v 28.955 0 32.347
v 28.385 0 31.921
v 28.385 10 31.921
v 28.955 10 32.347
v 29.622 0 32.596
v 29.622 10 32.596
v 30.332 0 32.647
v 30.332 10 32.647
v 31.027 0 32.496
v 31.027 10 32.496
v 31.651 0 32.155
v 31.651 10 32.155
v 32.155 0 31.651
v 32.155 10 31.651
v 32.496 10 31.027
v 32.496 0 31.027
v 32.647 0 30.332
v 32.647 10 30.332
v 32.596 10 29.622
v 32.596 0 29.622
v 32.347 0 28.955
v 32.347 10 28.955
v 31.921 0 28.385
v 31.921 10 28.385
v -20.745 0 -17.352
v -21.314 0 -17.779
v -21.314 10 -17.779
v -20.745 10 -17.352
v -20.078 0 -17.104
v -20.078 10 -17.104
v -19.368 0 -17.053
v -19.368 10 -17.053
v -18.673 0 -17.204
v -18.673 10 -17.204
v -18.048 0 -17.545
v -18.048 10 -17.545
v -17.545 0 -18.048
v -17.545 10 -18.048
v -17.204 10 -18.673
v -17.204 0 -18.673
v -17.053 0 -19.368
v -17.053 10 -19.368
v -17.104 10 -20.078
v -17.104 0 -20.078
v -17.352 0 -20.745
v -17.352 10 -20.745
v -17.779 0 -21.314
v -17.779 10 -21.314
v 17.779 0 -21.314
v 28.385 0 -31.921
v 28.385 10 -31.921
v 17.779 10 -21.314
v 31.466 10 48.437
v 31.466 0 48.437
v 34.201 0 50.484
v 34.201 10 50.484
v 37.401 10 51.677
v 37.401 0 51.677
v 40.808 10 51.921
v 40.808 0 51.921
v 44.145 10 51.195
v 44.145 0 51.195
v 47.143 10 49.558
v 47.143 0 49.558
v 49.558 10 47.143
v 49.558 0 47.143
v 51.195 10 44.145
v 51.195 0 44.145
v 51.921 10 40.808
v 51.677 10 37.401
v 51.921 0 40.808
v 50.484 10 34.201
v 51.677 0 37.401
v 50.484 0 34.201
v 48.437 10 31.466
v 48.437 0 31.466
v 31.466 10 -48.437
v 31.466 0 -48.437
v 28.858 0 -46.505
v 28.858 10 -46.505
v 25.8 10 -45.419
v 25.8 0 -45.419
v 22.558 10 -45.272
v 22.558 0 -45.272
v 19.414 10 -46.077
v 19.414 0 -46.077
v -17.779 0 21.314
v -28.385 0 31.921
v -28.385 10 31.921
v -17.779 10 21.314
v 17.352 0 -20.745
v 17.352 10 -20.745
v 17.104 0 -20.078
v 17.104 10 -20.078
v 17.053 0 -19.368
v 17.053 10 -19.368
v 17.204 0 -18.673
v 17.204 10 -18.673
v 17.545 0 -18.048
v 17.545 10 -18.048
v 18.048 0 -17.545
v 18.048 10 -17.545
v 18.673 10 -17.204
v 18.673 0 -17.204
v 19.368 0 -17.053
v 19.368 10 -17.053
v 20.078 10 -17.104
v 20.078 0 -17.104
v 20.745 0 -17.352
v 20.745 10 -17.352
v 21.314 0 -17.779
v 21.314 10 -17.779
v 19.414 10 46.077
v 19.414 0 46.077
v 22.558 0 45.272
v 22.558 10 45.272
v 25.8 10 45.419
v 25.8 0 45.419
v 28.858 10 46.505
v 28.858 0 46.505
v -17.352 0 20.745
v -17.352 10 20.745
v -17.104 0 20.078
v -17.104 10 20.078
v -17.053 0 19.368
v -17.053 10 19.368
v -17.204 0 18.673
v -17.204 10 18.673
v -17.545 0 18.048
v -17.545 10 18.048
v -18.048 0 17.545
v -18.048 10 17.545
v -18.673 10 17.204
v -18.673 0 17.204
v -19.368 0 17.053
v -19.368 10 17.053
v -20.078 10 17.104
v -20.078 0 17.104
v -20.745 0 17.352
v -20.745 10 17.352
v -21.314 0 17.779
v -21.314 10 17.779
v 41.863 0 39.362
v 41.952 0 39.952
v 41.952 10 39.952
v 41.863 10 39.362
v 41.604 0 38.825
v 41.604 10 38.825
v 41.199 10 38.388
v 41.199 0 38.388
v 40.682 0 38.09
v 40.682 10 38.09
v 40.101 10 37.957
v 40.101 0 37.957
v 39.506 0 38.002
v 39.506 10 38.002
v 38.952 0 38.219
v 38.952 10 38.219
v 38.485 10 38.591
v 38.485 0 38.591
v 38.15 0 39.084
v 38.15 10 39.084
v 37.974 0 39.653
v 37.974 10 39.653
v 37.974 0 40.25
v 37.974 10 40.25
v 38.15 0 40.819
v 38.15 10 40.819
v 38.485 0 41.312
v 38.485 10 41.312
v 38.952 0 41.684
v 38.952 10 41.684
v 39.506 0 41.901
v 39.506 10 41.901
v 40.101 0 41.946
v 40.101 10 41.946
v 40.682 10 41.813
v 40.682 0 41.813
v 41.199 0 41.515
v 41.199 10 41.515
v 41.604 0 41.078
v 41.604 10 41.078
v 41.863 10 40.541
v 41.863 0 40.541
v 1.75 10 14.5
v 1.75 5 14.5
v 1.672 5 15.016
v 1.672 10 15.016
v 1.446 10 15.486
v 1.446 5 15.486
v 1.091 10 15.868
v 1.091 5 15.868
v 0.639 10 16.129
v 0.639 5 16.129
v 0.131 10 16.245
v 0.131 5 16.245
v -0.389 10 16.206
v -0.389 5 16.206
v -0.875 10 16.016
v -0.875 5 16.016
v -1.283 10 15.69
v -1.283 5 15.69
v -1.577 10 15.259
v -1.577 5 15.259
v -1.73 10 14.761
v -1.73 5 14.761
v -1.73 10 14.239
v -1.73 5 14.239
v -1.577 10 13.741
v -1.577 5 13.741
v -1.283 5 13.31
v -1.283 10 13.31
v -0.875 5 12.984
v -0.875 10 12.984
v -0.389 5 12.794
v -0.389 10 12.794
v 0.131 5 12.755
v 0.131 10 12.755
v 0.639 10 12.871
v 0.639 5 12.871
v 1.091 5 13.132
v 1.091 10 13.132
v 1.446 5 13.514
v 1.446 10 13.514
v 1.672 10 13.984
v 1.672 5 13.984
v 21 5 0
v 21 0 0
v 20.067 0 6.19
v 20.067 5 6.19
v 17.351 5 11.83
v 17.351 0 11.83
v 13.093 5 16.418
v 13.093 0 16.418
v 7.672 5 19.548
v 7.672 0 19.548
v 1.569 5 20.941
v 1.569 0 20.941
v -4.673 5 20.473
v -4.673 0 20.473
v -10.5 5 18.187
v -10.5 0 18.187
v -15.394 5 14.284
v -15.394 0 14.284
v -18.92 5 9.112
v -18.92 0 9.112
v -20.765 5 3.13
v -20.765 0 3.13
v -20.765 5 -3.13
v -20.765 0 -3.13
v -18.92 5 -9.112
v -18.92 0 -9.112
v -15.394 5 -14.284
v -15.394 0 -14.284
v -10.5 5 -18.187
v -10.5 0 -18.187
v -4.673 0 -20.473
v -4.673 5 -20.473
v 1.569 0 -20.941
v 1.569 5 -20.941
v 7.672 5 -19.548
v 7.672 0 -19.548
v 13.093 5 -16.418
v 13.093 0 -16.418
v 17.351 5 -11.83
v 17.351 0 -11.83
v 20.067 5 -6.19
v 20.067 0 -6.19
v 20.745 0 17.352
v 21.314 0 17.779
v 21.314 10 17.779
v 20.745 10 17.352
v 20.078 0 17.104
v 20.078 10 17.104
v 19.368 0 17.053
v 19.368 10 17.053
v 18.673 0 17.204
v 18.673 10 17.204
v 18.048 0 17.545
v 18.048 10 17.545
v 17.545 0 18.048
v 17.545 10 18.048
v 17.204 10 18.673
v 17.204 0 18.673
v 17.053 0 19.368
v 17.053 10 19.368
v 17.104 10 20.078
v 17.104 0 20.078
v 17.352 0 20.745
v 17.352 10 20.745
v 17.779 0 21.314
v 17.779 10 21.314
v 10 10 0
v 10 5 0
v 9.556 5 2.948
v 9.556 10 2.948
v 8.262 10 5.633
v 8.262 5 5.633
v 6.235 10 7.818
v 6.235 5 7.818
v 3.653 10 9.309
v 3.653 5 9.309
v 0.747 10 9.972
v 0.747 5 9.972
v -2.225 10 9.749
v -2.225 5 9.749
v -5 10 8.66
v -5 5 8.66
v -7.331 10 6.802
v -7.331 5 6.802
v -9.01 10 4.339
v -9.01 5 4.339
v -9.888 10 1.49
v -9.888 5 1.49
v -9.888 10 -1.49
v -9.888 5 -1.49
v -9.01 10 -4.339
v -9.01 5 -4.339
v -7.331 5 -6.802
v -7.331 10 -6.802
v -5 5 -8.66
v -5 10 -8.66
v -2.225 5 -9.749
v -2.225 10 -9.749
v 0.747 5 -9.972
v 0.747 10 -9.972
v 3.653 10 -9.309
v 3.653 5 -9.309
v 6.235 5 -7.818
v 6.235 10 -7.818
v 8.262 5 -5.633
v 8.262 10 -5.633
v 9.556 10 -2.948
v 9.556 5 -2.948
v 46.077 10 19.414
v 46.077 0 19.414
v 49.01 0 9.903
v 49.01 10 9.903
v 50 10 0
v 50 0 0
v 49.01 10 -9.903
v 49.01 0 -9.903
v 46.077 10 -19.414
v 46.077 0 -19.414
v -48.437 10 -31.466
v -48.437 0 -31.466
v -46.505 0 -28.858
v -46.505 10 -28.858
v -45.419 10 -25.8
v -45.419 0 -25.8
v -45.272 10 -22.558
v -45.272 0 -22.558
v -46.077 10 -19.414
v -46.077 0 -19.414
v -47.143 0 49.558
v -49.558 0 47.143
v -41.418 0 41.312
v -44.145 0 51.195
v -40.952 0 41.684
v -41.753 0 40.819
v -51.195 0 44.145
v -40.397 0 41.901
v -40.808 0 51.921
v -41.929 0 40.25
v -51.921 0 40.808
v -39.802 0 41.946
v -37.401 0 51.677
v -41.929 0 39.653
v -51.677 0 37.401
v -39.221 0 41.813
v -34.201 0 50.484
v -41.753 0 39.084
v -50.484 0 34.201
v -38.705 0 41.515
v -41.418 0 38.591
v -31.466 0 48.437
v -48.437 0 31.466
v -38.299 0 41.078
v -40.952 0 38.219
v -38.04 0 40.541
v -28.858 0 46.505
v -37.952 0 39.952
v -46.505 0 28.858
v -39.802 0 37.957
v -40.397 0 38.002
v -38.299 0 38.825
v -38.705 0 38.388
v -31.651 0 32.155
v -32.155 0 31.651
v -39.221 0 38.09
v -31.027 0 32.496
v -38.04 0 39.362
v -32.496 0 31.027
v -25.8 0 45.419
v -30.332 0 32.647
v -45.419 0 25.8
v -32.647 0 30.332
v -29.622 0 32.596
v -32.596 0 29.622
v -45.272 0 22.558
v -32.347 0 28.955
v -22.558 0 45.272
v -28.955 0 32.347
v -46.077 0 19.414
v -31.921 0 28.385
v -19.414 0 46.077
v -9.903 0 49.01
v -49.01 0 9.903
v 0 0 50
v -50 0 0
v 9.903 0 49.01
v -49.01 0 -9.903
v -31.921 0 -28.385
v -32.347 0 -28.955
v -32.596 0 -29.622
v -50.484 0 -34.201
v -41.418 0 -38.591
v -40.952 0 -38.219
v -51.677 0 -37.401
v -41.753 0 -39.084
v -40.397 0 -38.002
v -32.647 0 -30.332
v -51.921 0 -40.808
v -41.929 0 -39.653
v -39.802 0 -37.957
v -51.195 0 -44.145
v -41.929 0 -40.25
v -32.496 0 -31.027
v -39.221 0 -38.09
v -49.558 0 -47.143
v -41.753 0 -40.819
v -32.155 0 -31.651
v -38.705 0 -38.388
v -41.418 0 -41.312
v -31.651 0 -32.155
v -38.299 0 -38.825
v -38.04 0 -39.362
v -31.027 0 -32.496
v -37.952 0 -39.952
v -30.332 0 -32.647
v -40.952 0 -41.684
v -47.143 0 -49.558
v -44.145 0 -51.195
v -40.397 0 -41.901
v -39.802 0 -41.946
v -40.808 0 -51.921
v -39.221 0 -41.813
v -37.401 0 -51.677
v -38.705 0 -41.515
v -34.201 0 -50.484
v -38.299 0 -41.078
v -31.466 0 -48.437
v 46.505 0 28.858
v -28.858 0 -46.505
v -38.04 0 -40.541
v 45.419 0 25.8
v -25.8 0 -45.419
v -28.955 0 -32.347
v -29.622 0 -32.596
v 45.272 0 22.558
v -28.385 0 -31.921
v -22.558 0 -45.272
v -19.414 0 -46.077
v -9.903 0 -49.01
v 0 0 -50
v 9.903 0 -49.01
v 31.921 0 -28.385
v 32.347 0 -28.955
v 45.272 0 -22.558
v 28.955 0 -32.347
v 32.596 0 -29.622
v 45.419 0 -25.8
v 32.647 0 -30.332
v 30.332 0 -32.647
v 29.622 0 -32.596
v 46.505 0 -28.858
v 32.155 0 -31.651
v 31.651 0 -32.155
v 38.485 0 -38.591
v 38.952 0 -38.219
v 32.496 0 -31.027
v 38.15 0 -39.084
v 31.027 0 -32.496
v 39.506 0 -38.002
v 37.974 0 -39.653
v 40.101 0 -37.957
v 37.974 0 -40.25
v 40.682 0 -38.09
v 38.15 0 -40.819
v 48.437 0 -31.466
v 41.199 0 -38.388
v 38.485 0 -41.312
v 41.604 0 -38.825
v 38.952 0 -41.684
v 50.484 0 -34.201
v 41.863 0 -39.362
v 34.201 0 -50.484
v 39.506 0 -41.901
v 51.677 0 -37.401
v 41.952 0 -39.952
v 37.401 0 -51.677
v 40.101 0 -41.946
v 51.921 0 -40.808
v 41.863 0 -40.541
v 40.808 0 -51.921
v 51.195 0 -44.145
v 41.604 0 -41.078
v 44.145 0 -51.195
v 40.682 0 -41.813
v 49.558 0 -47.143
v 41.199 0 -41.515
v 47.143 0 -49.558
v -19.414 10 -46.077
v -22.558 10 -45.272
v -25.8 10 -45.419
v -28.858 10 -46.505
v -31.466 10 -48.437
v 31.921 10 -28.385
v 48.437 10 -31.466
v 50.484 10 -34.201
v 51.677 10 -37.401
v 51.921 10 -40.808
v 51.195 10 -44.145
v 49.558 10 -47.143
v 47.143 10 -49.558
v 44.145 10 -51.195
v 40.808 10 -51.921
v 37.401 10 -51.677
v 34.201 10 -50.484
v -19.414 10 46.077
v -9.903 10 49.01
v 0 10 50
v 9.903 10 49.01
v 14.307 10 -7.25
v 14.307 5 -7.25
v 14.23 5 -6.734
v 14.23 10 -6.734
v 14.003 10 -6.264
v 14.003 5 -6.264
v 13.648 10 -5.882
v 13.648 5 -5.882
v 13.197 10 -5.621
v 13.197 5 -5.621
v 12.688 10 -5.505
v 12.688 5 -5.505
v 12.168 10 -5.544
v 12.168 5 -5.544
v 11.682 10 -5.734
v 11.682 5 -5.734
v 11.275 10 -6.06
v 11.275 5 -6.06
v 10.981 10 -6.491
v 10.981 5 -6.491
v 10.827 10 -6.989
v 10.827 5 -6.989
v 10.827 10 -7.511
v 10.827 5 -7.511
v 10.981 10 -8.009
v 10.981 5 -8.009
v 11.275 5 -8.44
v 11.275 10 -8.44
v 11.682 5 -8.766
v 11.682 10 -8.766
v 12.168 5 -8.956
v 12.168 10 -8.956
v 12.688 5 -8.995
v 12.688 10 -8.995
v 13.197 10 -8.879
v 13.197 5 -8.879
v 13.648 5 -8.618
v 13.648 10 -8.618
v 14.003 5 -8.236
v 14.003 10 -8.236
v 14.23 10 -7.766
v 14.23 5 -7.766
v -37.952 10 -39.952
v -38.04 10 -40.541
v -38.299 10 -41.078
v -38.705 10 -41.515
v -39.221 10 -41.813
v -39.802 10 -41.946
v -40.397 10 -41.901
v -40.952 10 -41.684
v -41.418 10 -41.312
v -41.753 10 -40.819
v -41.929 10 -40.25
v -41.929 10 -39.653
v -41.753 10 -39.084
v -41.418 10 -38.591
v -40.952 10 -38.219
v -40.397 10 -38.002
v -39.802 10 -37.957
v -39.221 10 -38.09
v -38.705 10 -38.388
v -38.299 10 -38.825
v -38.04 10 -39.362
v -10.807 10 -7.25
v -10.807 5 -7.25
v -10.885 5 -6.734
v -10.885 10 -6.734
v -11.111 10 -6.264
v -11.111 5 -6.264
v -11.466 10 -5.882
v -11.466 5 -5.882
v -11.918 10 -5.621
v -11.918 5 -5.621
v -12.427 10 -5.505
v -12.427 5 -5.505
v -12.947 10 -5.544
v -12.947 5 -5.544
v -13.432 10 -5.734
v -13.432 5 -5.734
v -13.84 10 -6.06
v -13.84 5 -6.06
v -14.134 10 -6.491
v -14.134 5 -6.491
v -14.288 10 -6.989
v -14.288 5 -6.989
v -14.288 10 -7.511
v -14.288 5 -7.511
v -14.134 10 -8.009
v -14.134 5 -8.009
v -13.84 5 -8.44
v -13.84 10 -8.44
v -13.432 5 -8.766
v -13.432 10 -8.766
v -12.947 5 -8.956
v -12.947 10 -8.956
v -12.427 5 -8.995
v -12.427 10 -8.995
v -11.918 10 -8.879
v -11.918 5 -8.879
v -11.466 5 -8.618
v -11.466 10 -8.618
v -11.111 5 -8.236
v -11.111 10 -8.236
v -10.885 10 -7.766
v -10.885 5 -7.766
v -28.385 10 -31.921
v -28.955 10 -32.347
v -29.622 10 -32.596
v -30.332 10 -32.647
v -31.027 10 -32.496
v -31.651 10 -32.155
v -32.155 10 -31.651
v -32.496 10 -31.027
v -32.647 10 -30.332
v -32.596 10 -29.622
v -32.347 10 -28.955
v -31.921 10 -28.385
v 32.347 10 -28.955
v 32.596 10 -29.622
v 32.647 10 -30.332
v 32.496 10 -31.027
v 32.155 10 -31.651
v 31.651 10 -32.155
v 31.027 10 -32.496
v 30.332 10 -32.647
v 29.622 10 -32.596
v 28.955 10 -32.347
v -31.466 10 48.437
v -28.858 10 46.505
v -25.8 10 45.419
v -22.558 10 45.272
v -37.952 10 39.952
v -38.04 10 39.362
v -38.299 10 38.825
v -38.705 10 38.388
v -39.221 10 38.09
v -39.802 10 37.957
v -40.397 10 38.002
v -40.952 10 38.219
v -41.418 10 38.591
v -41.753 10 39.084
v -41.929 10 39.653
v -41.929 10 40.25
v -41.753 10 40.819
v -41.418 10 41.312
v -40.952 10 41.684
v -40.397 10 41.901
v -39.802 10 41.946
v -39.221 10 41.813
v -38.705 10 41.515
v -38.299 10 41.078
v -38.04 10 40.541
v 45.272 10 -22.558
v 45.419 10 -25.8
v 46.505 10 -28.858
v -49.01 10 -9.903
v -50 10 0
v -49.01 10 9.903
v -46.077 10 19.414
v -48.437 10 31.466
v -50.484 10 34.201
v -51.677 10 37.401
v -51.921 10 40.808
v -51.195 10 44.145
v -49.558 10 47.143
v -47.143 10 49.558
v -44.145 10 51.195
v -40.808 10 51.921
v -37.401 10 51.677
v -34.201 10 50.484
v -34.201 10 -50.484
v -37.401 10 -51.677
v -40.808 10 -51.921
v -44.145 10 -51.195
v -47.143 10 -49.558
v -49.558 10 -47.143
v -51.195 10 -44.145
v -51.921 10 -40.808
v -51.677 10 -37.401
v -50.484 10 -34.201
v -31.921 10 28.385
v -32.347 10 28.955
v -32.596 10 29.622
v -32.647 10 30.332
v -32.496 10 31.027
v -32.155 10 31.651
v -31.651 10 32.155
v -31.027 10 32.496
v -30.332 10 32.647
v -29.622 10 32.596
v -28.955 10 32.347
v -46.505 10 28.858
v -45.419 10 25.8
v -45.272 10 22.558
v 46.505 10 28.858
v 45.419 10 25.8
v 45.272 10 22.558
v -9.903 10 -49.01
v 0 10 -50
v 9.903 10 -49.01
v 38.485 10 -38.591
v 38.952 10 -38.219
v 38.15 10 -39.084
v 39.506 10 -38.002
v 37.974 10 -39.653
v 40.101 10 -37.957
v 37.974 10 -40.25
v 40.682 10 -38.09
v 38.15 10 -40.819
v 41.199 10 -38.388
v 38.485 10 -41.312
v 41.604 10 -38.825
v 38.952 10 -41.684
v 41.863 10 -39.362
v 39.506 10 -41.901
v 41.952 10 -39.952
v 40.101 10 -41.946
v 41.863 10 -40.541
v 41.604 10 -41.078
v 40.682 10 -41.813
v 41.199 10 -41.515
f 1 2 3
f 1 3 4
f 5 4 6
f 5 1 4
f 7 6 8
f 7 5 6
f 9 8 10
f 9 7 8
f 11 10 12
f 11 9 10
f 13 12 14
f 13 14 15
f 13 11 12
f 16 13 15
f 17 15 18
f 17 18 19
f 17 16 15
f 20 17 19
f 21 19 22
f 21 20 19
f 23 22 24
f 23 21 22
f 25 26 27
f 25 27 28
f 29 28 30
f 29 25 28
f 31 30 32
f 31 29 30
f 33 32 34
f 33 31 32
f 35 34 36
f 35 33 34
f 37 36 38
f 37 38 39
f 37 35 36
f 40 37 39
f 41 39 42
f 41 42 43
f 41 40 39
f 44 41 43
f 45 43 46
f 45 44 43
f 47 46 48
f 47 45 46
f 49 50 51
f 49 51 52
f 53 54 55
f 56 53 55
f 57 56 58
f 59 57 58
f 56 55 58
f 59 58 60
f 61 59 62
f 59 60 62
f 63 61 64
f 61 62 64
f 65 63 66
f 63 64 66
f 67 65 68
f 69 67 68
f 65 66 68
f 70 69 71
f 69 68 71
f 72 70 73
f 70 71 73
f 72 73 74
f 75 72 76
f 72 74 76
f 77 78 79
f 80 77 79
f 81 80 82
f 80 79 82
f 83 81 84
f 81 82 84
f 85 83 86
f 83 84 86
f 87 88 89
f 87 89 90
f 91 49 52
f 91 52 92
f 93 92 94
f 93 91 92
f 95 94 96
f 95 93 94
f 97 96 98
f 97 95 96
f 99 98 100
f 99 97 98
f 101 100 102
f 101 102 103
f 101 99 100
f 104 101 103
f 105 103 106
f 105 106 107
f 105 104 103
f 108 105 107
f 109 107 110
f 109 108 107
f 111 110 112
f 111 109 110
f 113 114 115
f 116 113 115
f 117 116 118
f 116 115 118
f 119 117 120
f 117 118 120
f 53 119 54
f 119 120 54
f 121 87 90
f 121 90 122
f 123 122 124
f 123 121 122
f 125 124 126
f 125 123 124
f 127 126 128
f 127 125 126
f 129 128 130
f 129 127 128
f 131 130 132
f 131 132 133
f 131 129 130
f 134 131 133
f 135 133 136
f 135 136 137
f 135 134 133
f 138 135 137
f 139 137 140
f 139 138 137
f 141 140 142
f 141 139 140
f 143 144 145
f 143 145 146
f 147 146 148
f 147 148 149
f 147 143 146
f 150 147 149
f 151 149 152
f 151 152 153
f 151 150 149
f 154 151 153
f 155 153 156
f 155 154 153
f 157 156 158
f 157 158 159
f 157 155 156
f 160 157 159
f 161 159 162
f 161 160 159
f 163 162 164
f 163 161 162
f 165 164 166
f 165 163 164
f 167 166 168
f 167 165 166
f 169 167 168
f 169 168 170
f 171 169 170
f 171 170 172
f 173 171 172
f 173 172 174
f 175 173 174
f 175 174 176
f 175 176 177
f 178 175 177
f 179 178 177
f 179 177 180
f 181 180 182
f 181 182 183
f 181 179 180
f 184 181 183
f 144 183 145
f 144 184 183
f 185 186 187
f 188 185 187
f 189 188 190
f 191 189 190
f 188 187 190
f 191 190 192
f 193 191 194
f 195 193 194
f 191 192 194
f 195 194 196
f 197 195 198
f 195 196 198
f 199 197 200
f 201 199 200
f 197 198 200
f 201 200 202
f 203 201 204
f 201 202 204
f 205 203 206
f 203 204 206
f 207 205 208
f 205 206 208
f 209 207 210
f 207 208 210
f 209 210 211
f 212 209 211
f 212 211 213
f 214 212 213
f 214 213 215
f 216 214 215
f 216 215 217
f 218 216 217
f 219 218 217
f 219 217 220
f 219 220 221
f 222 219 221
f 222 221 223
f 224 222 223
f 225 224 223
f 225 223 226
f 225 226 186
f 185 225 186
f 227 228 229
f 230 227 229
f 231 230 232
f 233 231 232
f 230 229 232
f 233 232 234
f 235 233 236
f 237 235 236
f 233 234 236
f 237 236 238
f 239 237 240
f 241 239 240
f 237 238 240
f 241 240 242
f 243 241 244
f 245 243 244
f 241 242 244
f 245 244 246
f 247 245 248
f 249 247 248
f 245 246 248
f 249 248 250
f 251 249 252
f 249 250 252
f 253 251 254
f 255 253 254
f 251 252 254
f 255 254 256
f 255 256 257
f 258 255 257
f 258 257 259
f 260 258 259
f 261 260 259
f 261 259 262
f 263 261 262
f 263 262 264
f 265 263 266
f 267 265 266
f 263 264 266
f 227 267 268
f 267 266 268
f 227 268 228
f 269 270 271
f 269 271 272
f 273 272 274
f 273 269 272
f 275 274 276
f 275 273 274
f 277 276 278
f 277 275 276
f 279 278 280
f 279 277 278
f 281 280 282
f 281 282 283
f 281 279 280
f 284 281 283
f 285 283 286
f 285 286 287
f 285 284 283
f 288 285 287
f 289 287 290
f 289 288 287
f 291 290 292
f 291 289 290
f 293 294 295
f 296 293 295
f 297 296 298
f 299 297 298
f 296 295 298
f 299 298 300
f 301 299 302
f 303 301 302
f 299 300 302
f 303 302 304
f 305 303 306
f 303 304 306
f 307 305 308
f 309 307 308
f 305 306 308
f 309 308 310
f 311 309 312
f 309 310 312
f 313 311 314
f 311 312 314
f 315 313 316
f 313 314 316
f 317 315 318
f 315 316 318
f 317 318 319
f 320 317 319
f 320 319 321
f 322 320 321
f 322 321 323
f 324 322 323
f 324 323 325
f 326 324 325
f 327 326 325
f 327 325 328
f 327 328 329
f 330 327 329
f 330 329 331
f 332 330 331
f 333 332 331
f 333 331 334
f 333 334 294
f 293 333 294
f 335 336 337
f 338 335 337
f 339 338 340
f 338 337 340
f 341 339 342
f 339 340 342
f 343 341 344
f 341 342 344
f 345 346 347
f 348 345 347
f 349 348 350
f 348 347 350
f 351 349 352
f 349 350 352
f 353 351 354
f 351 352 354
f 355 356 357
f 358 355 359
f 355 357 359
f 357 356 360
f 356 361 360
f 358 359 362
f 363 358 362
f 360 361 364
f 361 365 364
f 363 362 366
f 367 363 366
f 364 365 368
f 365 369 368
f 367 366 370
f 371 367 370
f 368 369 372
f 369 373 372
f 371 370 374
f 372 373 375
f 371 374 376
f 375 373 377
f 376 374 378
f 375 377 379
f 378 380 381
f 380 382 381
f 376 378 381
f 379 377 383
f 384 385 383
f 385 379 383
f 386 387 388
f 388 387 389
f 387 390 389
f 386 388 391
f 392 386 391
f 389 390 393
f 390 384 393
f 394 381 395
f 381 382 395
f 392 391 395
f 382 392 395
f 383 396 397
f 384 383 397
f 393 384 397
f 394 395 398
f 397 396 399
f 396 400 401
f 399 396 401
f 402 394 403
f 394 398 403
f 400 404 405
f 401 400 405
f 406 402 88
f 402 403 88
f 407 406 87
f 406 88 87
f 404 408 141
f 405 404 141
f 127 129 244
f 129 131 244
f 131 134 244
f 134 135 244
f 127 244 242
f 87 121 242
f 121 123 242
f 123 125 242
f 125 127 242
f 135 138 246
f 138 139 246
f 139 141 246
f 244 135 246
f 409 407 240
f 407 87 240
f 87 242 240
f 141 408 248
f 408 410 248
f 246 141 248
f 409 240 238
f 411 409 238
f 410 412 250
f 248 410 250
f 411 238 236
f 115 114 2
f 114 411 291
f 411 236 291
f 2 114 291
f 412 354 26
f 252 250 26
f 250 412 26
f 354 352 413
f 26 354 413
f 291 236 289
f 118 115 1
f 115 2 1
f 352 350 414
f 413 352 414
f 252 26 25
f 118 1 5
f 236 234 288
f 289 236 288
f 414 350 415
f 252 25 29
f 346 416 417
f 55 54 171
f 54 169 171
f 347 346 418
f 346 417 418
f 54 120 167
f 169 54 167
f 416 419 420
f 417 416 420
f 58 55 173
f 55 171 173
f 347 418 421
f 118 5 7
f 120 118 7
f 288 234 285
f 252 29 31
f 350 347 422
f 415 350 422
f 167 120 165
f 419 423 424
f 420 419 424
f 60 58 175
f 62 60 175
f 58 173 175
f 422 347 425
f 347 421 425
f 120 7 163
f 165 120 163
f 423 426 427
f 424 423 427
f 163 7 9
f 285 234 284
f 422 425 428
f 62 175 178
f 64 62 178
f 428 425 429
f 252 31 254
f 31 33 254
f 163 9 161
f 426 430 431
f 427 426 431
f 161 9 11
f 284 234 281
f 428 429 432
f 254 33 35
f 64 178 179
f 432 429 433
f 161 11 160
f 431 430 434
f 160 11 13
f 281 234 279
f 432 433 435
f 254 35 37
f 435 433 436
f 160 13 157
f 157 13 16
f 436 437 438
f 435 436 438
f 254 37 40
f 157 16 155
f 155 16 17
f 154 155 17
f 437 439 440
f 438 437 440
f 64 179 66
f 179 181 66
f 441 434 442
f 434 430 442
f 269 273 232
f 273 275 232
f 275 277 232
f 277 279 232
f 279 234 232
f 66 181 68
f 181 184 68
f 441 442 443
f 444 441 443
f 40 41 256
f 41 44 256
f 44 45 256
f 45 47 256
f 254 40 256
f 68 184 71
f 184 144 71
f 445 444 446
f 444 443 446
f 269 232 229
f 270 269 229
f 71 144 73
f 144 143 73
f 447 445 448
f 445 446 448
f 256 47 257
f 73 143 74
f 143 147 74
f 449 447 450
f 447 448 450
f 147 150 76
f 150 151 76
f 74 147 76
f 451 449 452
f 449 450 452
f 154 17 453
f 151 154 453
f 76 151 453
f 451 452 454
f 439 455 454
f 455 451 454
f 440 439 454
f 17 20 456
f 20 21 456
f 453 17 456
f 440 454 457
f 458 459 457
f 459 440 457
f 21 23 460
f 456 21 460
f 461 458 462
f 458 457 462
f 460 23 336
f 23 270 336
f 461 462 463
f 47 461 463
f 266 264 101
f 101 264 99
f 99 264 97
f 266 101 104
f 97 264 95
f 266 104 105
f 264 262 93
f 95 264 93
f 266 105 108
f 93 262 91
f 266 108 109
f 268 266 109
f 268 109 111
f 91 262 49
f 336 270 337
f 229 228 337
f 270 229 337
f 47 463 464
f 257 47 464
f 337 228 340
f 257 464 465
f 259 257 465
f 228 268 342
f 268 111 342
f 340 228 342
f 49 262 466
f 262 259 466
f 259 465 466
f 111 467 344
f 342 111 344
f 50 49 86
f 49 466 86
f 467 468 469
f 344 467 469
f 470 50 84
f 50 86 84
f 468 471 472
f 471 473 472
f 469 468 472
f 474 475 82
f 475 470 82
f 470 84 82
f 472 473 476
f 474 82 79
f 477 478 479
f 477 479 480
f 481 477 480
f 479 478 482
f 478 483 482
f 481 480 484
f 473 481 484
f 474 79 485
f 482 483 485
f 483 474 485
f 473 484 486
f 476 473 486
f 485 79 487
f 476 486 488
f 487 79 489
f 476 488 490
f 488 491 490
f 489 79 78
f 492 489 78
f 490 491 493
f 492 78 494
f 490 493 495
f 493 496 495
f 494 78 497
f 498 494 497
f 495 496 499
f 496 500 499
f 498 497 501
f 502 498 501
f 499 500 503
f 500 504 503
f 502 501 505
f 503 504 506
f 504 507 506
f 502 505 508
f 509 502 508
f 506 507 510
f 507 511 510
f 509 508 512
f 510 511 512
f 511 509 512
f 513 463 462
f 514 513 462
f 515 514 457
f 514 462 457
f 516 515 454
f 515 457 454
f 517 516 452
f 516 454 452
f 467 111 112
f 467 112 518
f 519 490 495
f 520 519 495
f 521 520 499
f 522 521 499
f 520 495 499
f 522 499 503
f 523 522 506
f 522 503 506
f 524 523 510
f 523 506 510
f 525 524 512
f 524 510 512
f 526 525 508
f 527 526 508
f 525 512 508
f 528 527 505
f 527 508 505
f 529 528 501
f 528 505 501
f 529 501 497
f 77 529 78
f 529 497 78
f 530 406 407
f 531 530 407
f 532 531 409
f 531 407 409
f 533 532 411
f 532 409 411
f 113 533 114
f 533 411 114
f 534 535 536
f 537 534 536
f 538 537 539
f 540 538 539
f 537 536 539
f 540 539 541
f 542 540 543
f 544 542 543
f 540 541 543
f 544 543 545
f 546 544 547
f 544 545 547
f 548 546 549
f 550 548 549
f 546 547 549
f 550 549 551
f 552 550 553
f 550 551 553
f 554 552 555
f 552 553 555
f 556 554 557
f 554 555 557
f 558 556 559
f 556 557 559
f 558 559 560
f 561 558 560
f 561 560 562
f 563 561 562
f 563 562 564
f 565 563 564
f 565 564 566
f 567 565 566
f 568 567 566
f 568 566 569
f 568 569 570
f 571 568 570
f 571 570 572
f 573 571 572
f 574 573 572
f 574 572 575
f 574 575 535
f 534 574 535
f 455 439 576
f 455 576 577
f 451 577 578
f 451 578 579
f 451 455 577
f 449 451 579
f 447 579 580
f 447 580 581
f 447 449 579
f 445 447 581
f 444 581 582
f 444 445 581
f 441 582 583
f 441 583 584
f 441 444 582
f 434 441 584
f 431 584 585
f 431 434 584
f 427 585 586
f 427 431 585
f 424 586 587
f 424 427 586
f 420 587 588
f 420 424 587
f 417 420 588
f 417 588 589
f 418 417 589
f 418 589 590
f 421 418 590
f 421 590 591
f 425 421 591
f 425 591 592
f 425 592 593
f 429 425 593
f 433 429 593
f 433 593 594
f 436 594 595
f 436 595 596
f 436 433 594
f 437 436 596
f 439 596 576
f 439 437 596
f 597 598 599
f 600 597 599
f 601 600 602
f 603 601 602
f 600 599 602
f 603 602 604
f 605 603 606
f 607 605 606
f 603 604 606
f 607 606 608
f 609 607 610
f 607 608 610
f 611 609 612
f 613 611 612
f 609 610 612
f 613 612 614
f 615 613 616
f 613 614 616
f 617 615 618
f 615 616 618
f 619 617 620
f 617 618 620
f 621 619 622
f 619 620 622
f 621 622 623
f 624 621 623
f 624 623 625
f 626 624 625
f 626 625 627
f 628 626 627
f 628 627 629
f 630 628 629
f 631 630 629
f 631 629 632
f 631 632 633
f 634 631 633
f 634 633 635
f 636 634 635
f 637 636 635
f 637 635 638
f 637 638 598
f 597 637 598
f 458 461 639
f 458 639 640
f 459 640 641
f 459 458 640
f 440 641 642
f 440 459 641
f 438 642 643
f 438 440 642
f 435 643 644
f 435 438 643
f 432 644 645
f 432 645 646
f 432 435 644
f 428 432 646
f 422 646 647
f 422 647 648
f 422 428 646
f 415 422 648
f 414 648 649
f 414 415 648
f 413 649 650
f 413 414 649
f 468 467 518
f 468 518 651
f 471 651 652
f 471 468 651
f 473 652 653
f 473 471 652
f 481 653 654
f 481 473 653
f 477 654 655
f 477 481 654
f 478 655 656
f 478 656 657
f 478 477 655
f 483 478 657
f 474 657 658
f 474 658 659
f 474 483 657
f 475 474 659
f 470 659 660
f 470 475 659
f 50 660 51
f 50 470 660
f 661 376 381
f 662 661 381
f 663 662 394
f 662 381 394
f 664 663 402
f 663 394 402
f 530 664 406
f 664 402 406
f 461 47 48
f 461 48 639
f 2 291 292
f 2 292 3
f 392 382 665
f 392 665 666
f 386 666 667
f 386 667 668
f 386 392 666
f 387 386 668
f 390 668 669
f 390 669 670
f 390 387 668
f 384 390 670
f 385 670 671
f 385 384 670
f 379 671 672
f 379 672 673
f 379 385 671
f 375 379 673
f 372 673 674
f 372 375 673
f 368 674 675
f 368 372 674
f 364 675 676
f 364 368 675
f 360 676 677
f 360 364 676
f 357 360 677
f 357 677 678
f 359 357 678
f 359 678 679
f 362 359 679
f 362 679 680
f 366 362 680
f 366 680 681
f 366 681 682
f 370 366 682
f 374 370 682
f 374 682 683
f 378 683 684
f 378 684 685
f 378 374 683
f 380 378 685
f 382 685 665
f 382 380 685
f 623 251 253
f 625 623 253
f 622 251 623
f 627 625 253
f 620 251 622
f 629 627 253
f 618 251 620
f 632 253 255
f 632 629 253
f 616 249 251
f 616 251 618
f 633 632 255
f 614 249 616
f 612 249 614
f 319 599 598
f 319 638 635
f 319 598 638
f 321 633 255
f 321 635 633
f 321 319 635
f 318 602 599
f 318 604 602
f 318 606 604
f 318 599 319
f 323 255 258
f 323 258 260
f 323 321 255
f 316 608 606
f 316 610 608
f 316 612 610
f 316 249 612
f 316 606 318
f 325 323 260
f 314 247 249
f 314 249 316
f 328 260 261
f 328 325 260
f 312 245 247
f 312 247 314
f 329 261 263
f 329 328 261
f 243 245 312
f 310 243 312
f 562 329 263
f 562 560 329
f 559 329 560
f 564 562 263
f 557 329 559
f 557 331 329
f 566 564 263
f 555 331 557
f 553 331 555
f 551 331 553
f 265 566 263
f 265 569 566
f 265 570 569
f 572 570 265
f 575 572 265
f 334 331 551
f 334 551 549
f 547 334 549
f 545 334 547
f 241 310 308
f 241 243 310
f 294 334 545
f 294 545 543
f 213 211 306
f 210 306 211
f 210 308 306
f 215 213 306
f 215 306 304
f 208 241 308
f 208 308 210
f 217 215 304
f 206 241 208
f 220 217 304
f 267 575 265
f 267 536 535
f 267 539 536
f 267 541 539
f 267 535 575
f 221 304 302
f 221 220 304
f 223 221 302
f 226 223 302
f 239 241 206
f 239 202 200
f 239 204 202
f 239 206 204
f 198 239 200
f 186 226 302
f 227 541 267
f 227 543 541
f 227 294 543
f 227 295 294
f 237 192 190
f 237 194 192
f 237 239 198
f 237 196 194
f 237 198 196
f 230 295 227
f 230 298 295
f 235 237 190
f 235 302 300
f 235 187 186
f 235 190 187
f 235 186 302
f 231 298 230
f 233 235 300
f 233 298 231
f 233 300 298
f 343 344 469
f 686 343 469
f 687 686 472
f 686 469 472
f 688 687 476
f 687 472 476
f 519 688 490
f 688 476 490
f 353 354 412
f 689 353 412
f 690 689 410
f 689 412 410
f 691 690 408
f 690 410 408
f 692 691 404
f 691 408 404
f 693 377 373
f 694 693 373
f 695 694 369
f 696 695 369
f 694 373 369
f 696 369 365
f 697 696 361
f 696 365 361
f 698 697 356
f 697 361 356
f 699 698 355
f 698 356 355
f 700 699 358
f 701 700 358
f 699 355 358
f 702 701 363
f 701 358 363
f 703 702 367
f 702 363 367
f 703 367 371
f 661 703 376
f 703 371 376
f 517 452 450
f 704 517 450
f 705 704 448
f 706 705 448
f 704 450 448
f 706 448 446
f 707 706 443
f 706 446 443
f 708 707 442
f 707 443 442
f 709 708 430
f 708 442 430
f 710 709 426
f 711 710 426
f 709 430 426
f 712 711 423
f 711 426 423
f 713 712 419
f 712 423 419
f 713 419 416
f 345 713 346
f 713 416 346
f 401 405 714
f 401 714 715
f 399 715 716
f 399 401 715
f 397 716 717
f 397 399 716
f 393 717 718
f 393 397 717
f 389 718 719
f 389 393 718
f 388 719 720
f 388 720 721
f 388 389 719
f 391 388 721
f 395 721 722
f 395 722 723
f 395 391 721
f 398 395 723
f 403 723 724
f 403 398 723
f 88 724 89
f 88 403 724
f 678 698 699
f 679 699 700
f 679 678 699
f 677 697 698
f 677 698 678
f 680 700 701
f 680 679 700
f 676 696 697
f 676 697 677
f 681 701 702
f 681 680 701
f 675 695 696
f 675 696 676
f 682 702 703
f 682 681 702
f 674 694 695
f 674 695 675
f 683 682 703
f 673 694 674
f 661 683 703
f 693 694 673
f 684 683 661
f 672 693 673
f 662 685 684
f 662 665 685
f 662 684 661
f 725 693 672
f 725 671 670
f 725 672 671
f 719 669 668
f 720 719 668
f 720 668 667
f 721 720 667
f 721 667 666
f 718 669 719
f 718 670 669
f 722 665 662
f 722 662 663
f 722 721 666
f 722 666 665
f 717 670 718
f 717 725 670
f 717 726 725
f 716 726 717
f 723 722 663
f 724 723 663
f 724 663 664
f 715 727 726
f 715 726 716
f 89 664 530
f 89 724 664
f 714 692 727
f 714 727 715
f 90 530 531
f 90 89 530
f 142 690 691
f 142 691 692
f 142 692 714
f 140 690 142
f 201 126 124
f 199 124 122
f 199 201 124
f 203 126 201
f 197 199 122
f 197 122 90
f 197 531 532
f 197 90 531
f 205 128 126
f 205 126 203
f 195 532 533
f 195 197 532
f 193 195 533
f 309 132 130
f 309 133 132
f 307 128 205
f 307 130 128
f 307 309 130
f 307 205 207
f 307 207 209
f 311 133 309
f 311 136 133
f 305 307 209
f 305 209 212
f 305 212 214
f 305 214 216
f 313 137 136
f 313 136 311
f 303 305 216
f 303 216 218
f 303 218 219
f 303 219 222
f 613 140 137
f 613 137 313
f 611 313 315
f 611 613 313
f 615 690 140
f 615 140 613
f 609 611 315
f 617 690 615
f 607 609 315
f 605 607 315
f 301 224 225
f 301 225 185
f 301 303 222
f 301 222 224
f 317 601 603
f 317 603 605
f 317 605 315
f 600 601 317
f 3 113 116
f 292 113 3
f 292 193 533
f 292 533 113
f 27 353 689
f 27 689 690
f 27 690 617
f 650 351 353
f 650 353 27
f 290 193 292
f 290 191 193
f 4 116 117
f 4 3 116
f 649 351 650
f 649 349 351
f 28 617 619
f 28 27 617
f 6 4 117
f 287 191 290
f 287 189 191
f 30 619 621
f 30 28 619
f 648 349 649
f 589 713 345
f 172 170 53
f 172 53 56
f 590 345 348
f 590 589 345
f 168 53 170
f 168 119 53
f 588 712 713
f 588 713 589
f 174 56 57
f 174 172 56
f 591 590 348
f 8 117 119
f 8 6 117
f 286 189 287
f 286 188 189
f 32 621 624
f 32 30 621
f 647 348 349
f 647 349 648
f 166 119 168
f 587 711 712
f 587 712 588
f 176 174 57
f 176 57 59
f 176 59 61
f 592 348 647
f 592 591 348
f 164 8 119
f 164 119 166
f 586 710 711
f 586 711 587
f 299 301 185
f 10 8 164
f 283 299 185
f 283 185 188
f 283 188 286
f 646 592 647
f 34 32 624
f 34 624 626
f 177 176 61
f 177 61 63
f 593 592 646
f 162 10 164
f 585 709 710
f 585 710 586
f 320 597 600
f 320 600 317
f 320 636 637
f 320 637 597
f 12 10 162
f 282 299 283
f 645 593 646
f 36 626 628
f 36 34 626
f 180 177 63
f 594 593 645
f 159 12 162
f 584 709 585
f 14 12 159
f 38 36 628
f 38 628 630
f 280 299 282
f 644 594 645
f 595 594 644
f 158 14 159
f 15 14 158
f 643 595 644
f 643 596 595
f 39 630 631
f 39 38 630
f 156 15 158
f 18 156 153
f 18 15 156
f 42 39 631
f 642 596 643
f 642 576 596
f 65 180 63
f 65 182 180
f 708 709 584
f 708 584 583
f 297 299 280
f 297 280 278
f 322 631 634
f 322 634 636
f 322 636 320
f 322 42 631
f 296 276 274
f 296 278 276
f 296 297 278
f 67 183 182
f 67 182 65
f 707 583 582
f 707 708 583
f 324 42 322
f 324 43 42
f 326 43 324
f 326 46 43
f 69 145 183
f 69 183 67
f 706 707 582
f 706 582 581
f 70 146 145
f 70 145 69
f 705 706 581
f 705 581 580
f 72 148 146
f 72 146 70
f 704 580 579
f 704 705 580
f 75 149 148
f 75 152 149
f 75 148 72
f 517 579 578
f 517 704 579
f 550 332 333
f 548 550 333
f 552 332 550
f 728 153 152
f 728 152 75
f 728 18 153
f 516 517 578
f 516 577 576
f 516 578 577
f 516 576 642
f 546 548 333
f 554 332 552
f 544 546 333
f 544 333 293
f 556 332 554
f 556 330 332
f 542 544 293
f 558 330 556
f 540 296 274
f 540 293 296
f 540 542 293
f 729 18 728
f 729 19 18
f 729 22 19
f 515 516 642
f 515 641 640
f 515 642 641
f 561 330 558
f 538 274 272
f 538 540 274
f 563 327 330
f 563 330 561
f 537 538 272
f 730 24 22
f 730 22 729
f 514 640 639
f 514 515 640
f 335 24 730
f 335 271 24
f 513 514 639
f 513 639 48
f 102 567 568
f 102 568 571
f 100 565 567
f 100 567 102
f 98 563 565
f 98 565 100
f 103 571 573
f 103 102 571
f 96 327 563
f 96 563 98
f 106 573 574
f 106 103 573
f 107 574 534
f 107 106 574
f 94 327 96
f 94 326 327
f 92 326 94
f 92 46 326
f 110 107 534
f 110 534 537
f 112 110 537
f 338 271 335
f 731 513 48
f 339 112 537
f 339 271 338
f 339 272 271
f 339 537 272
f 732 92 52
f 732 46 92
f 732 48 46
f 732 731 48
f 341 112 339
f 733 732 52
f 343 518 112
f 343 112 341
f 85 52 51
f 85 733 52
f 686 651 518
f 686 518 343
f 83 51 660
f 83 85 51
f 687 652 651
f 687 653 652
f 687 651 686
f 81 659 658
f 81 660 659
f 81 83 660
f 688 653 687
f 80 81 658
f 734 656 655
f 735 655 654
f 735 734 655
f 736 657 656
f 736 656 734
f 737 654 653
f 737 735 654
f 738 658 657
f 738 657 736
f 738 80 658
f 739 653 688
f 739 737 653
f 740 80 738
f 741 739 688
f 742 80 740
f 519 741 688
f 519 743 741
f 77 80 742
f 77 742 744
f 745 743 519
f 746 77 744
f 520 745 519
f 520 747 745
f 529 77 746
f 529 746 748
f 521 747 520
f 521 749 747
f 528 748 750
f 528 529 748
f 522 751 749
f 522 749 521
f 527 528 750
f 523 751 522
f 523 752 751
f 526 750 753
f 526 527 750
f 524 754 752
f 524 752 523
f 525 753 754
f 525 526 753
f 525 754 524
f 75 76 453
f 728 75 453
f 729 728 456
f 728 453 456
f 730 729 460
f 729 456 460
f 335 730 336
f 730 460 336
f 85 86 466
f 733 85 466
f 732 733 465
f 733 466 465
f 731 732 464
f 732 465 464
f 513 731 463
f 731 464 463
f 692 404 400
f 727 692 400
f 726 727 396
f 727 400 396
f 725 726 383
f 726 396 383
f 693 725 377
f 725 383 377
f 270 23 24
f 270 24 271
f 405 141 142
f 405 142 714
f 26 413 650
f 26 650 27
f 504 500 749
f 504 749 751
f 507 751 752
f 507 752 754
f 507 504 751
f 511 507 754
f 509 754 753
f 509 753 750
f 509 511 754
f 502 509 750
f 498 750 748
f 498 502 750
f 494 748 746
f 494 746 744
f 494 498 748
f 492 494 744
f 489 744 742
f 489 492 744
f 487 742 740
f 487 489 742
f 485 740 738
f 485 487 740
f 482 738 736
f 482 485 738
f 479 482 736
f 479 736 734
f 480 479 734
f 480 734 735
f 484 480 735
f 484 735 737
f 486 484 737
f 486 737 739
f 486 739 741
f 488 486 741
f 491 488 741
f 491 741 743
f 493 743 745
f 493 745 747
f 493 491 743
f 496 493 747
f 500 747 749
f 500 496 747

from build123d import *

# Parameters (mm, degrees)
SKETCH1_R           = 2
BOSS_EXTRUDE1_DEPTH = 10
SKETCH3_R           = 21
CUT_EXTRUDE2_DEPTH  = 5
SKETCH3_4_R         = 1.75
CUT_EXTRUDE3_DEPTH  = 75.1479844
SKETCH3_5_R         = 10
CUT_EXTRUDE4_DEPTH  = 75.1479844


with BuildPart() as part:
    # Sketch1 → Boss-Extrude1 (new body)
    with BuildSketch(Plane(origin=(0, 0, 0), x_dir=(1, 0, 0), z_dir=(0, 1, 0))):
        with BuildLine():
            ThreePointArc((46.077281732, -19.413503243), (50, 0), (46.077281732, 19.413503243))
            ThreePointArc((46.077281732, 19.413503243), (45.41900176, 25.799706685), (48.436814511, 31.466251763))
            ThreePointArc((48.436814511, 31.466251763), (48.436814511, 48.436814511), (31.466251763, 48.436814511))
            ThreePointArc((31.466251763, 48.436814511), (25.799706685, 45.41900176), (19.413503243, 46.077281732))
            ThreePointArc((19.413503243, 46.077281732), (0, 50), (-19.413503243, 46.077281732))
            ThreePointArc((-19.413503243, 46.077281732), (-25.799706685, 45.41900176), (-31.466251763, 48.436814511))
            ThreePointArc((-31.466251763, 48.436814511), (-48.436814511, 48.436814511), (-48.436814511, 31.466251763))
            ThreePointArc((-48.436814511, 31.466251763), (-45.41900176, 25.799706685), (-46.077281732, 19.413503243))
            ThreePointArc((-46.077281732, 19.413503243), (-50, 0), (-46.077281732, -19.413503243))
            ThreePointArc((-46.077281732, -19.413503243), (-45.41900176, -25.799706685), (-48.436814511, -31.466251763))
            ThreePointArc((-48.436814511, -31.466251763), (-48.436814511, -48.436814511), (-31.466251763, -48.436814511))
            ThreePointArc((-31.466251763, -48.436814511), (-25.799706685, -45.41900176), (-19.413503243, -46.077281732))
            ThreePointArc((-19.413503243, -46.077281732), (0, -50), (19.413503243, -46.077281732))
            ThreePointArc((19.413503243, -46.077281732), (25.799706685, -45.41900176), (31.466251763, -48.436814511))
            ThreePointArc((31.466251763, -48.436814511), (48.436814511, -48.436814511), (48.436814511, -31.466251763))
            ThreePointArc((48.436814511, -31.466251763), (45.41900176, -25.799706685), (46.077281732, -19.413503243))
        make_face()
        with BuildLine():
            Line((-31.921022838, -28.385488932), (-21.31442112, -17.778887214))
            ThreePointArc((-21.31442112, -17.778887214), (-17.778887214, -17.778887214), (-17.778887214, -21.31442112))
            Line((-17.778887214, -21.31442112), (-28.385488932, -31.921022838))
            ThreePointArc((-28.385488932, -31.921022838), (-31.921022838, -31.921022838), (-31.921022838, -28.385488932))
        make_face(mode=Mode.SUBTRACT)
        with BuildLine():
            Line((28.385488932, -31.921022838), (17.778887214, -21.31442112))
            ThreePointArc((17.778887214, -21.31442112), (17.778887214, -17.778887214), (21.31442112, -17.778887214))
            Line((21.31442112, -17.778887214), (31.921022838, -28.385488932))
            ThreePointArc((31.921022838, -28.385488932), (31.921022838, -31.921022838), (28.385488932, -31.921022838))
        make_face(mode=Mode.SUBTRACT)
        with BuildLine():
            Line((-28.385488932, 31.921022838), (-17.778887214, 21.31442112))
            ThreePointArc((-17.778887214, 21.31442112), (-17.778887214, 17.778887214), (-21.31442112, 17.778887214))
            Line((-21.31442112, 17.778887214), (-31.921022838, 28.385488932))
            ThreePointArc((-31.921022838, 28.385488932), (-31.921022838, 31.921022838), (-28.385488932, 31.921022838))
        make_face(mode=Mode.SUBTRACT)
        with BuildLine():
            ThreePointArc((21.31442112, 17.778887214), (17.778887214, 17.778887214), (17.778887214, 21.31442112))
            Line((17.778887214, 21.31442112), (28.385488932, 31.921022838))
            ThreePointArc((28.385488932, 31.921022838), (31.921022838, 31.921022838), (31.921022838, 28.385488932))
            Line((31.921022838, 28.385488932), (21.31442112, 17.778887214))
        make_face(mode=Mode.SUBTRACT)
        with Locations((39.951533137, -39.951533137)):
            Circle(SKETCH1_R, mode=Mode.SUBTRACT)
        with Locations((-39.951533137, -39.951533137)):
            Circle(SKETCH1_R, mode=Mode.SUBTRACT)
        with Locations((-39.951533137, 39.951533137)):
            Circle(SKETCH1_R, mode=Mode.SUBTRACT)
        with Locations((39.951533137, 39.951533137)):
            Circle(SKETCH1_R, mode=Mode.SUBTRACT)
    extrude(amount=BOSS_EXTRUDE1_DEPTH)

    # Sketch3 → Cut-Extrude2 (cut)
    with BuildSketch(Plane.XZ):
        Circle(SKETCH3_R)
    extrude(amount=-CUT_EXTRUDE2_DEPTH, mode=Mode.SUBTRACT)

    # Sketch3<4> → Cut-Extrude3 (cut, through all)
    with BuildSketch(Plane.XZ):
        with Locations((0, 14.5)):
            Circle(SKETCH3_4_R)
        with Locations((12.557368355, -7.25)):
            Circle(SKETCH3_4_R)
        with Locations((-12.557368355, -7.25)):
            Circle(SKETCH3_4_R)
    extrude(amount=-CUT_EXTRUDE3_DEPTH, mode=Mode.SUBTRACT)

    # Sketch3<5> → Cut-Extrude4 (cut, through all)
    with BuildSketch(Plane.XZ):
        Circle(SKETCH3_5_R)
    extrude(amount=-CUT_EXTRUDE4_DEPTH, mode=Mode.SUBTRACT)


solid = part.part
